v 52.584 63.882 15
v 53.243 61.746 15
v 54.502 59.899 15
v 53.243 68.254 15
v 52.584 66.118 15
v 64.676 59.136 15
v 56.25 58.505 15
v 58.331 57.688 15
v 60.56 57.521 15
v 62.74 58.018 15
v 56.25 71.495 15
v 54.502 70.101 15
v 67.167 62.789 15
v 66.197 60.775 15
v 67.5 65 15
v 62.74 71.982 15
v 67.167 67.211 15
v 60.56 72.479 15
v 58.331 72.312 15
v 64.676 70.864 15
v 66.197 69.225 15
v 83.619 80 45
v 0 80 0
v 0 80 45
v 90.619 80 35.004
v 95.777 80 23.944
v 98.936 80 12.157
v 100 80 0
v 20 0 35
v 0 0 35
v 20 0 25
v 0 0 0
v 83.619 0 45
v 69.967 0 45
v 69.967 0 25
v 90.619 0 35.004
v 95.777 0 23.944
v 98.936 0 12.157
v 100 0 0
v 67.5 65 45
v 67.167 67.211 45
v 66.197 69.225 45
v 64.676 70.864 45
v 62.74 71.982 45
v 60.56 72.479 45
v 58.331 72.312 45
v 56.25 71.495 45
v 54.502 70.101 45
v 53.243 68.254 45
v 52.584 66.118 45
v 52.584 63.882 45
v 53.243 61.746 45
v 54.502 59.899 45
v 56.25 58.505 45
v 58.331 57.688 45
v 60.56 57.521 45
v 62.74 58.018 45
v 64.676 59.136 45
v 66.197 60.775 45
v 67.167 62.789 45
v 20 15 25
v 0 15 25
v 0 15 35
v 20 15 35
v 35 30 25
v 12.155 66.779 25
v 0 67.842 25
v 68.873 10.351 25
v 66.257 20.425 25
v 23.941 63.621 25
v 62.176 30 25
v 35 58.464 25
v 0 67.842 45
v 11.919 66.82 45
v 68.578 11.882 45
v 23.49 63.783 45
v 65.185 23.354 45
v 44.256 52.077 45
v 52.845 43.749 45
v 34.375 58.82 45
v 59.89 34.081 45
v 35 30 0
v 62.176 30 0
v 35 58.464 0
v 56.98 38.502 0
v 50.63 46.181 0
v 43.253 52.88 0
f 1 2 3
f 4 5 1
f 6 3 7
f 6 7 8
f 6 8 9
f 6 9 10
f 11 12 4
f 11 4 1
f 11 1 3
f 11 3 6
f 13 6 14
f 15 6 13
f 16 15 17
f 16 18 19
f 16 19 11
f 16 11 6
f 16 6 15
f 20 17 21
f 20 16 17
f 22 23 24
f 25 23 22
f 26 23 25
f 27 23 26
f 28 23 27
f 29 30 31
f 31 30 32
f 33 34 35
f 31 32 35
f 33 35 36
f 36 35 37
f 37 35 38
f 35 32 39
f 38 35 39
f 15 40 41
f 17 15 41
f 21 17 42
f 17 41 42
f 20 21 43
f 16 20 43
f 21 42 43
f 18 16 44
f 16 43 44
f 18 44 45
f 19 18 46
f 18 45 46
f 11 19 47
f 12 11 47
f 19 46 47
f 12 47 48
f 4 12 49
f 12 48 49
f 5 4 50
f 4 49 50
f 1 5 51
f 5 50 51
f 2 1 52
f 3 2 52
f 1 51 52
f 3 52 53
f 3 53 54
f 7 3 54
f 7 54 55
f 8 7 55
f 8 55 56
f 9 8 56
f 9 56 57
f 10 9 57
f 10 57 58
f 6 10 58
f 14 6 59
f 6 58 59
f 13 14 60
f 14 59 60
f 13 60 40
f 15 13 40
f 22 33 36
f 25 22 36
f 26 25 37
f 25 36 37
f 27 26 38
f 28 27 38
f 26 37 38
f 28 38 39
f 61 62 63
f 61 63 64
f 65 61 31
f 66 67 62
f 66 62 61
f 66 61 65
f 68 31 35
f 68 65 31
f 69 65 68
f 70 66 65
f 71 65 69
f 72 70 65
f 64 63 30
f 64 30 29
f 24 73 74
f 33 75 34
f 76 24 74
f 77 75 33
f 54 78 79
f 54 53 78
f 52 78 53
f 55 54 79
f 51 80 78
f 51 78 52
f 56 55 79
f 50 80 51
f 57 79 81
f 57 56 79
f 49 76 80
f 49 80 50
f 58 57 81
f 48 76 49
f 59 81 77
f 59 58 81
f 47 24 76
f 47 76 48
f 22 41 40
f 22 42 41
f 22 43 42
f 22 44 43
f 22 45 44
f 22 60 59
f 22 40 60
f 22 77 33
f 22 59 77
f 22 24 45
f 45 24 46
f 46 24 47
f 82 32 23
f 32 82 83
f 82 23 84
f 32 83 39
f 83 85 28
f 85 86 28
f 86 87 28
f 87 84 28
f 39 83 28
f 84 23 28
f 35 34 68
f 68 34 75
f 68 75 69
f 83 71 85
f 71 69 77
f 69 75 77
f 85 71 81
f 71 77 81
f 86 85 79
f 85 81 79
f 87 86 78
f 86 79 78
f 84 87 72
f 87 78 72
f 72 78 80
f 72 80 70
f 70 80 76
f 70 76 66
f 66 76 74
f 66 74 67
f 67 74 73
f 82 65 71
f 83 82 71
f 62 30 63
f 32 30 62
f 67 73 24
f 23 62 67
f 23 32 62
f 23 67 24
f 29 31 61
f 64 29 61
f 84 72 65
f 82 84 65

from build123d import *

# Parameters (mm, degrees)
F0_W      = 100
F0_H      = 80
F1_DEPTH  = 45
F2_R      = 70
F3_DEPTH  = 20
F4_W      = 20
F4_H      = 15
F5_DEPTH  = 10
F7_DEPTH  = 25
F8_R      = 7.5
F9_DEPTH  = 30
F11_DEPTH = 80


with BuildPart() as f1:
    # F0 (on Top) → F1 (new body)
    with BuildSketch(Plane.XY):
        with Locations((50, 40)):
            Rectangle(F0_W, F0_H)
    extrude(amount=F1_DEPTH)

    # F2 (on face) → F3 (cut)
    with BuildSketch(Plane.XY.offset(45)):
        with Locations((0, -2.1579118226)):
            Circle(F2_R)
    extrude(amount=-F3_DEPTH, mode=Mode.SUBTRACT)

    # F4 (on face) → F5 (join)
    with BuildSketch(Plane.XY.offset(25)):
        with Locations((10, 7.5)):
            Rectangle(F4_W, F4_H)
    extrude(amount=F5_DEPTH)

    # F6 (on face) → F7 (cut, through all)
    with BuildSketch(Plane.XY.offset(25)):
        with BuildLine():
            ThreePointArc((62.176110422, 30), (50.6295075267, 46.1810265977), (35, 58.4638664423))
            Line((35, 58.4638664423), (35, 30))
            Line((35, 30), (62.176110422, 30))
        make_face()
    extrude(amount=-F7_DEPTH, mode=Mode.SUBTRACT)

    # F8 (on face) → F9 (cut)
    with BuildSketch(Plane.XY.offset(45)):
        with Locations((60, 65)):
            Circle(F8_R)
    extrude(amount=-F9_DEPTH, mode=Mode.SUBTRACT)

    # F10 (on face) → F11 (cut, through all)
    with BuildSketch(Plane.XZ):
        with BuildLine():
            ThreePointArc((83.6190264738, 45), (95.7773967757, 23.944395449), (100, 0))
            Line((100, 0), (100, 45))
            Line((100, 45), (83.6190264738, 45))
        make_face()
    extrude(amount=-F11_DEPTH, mode=Mode.SUBTRACT)


solid = f1.part
